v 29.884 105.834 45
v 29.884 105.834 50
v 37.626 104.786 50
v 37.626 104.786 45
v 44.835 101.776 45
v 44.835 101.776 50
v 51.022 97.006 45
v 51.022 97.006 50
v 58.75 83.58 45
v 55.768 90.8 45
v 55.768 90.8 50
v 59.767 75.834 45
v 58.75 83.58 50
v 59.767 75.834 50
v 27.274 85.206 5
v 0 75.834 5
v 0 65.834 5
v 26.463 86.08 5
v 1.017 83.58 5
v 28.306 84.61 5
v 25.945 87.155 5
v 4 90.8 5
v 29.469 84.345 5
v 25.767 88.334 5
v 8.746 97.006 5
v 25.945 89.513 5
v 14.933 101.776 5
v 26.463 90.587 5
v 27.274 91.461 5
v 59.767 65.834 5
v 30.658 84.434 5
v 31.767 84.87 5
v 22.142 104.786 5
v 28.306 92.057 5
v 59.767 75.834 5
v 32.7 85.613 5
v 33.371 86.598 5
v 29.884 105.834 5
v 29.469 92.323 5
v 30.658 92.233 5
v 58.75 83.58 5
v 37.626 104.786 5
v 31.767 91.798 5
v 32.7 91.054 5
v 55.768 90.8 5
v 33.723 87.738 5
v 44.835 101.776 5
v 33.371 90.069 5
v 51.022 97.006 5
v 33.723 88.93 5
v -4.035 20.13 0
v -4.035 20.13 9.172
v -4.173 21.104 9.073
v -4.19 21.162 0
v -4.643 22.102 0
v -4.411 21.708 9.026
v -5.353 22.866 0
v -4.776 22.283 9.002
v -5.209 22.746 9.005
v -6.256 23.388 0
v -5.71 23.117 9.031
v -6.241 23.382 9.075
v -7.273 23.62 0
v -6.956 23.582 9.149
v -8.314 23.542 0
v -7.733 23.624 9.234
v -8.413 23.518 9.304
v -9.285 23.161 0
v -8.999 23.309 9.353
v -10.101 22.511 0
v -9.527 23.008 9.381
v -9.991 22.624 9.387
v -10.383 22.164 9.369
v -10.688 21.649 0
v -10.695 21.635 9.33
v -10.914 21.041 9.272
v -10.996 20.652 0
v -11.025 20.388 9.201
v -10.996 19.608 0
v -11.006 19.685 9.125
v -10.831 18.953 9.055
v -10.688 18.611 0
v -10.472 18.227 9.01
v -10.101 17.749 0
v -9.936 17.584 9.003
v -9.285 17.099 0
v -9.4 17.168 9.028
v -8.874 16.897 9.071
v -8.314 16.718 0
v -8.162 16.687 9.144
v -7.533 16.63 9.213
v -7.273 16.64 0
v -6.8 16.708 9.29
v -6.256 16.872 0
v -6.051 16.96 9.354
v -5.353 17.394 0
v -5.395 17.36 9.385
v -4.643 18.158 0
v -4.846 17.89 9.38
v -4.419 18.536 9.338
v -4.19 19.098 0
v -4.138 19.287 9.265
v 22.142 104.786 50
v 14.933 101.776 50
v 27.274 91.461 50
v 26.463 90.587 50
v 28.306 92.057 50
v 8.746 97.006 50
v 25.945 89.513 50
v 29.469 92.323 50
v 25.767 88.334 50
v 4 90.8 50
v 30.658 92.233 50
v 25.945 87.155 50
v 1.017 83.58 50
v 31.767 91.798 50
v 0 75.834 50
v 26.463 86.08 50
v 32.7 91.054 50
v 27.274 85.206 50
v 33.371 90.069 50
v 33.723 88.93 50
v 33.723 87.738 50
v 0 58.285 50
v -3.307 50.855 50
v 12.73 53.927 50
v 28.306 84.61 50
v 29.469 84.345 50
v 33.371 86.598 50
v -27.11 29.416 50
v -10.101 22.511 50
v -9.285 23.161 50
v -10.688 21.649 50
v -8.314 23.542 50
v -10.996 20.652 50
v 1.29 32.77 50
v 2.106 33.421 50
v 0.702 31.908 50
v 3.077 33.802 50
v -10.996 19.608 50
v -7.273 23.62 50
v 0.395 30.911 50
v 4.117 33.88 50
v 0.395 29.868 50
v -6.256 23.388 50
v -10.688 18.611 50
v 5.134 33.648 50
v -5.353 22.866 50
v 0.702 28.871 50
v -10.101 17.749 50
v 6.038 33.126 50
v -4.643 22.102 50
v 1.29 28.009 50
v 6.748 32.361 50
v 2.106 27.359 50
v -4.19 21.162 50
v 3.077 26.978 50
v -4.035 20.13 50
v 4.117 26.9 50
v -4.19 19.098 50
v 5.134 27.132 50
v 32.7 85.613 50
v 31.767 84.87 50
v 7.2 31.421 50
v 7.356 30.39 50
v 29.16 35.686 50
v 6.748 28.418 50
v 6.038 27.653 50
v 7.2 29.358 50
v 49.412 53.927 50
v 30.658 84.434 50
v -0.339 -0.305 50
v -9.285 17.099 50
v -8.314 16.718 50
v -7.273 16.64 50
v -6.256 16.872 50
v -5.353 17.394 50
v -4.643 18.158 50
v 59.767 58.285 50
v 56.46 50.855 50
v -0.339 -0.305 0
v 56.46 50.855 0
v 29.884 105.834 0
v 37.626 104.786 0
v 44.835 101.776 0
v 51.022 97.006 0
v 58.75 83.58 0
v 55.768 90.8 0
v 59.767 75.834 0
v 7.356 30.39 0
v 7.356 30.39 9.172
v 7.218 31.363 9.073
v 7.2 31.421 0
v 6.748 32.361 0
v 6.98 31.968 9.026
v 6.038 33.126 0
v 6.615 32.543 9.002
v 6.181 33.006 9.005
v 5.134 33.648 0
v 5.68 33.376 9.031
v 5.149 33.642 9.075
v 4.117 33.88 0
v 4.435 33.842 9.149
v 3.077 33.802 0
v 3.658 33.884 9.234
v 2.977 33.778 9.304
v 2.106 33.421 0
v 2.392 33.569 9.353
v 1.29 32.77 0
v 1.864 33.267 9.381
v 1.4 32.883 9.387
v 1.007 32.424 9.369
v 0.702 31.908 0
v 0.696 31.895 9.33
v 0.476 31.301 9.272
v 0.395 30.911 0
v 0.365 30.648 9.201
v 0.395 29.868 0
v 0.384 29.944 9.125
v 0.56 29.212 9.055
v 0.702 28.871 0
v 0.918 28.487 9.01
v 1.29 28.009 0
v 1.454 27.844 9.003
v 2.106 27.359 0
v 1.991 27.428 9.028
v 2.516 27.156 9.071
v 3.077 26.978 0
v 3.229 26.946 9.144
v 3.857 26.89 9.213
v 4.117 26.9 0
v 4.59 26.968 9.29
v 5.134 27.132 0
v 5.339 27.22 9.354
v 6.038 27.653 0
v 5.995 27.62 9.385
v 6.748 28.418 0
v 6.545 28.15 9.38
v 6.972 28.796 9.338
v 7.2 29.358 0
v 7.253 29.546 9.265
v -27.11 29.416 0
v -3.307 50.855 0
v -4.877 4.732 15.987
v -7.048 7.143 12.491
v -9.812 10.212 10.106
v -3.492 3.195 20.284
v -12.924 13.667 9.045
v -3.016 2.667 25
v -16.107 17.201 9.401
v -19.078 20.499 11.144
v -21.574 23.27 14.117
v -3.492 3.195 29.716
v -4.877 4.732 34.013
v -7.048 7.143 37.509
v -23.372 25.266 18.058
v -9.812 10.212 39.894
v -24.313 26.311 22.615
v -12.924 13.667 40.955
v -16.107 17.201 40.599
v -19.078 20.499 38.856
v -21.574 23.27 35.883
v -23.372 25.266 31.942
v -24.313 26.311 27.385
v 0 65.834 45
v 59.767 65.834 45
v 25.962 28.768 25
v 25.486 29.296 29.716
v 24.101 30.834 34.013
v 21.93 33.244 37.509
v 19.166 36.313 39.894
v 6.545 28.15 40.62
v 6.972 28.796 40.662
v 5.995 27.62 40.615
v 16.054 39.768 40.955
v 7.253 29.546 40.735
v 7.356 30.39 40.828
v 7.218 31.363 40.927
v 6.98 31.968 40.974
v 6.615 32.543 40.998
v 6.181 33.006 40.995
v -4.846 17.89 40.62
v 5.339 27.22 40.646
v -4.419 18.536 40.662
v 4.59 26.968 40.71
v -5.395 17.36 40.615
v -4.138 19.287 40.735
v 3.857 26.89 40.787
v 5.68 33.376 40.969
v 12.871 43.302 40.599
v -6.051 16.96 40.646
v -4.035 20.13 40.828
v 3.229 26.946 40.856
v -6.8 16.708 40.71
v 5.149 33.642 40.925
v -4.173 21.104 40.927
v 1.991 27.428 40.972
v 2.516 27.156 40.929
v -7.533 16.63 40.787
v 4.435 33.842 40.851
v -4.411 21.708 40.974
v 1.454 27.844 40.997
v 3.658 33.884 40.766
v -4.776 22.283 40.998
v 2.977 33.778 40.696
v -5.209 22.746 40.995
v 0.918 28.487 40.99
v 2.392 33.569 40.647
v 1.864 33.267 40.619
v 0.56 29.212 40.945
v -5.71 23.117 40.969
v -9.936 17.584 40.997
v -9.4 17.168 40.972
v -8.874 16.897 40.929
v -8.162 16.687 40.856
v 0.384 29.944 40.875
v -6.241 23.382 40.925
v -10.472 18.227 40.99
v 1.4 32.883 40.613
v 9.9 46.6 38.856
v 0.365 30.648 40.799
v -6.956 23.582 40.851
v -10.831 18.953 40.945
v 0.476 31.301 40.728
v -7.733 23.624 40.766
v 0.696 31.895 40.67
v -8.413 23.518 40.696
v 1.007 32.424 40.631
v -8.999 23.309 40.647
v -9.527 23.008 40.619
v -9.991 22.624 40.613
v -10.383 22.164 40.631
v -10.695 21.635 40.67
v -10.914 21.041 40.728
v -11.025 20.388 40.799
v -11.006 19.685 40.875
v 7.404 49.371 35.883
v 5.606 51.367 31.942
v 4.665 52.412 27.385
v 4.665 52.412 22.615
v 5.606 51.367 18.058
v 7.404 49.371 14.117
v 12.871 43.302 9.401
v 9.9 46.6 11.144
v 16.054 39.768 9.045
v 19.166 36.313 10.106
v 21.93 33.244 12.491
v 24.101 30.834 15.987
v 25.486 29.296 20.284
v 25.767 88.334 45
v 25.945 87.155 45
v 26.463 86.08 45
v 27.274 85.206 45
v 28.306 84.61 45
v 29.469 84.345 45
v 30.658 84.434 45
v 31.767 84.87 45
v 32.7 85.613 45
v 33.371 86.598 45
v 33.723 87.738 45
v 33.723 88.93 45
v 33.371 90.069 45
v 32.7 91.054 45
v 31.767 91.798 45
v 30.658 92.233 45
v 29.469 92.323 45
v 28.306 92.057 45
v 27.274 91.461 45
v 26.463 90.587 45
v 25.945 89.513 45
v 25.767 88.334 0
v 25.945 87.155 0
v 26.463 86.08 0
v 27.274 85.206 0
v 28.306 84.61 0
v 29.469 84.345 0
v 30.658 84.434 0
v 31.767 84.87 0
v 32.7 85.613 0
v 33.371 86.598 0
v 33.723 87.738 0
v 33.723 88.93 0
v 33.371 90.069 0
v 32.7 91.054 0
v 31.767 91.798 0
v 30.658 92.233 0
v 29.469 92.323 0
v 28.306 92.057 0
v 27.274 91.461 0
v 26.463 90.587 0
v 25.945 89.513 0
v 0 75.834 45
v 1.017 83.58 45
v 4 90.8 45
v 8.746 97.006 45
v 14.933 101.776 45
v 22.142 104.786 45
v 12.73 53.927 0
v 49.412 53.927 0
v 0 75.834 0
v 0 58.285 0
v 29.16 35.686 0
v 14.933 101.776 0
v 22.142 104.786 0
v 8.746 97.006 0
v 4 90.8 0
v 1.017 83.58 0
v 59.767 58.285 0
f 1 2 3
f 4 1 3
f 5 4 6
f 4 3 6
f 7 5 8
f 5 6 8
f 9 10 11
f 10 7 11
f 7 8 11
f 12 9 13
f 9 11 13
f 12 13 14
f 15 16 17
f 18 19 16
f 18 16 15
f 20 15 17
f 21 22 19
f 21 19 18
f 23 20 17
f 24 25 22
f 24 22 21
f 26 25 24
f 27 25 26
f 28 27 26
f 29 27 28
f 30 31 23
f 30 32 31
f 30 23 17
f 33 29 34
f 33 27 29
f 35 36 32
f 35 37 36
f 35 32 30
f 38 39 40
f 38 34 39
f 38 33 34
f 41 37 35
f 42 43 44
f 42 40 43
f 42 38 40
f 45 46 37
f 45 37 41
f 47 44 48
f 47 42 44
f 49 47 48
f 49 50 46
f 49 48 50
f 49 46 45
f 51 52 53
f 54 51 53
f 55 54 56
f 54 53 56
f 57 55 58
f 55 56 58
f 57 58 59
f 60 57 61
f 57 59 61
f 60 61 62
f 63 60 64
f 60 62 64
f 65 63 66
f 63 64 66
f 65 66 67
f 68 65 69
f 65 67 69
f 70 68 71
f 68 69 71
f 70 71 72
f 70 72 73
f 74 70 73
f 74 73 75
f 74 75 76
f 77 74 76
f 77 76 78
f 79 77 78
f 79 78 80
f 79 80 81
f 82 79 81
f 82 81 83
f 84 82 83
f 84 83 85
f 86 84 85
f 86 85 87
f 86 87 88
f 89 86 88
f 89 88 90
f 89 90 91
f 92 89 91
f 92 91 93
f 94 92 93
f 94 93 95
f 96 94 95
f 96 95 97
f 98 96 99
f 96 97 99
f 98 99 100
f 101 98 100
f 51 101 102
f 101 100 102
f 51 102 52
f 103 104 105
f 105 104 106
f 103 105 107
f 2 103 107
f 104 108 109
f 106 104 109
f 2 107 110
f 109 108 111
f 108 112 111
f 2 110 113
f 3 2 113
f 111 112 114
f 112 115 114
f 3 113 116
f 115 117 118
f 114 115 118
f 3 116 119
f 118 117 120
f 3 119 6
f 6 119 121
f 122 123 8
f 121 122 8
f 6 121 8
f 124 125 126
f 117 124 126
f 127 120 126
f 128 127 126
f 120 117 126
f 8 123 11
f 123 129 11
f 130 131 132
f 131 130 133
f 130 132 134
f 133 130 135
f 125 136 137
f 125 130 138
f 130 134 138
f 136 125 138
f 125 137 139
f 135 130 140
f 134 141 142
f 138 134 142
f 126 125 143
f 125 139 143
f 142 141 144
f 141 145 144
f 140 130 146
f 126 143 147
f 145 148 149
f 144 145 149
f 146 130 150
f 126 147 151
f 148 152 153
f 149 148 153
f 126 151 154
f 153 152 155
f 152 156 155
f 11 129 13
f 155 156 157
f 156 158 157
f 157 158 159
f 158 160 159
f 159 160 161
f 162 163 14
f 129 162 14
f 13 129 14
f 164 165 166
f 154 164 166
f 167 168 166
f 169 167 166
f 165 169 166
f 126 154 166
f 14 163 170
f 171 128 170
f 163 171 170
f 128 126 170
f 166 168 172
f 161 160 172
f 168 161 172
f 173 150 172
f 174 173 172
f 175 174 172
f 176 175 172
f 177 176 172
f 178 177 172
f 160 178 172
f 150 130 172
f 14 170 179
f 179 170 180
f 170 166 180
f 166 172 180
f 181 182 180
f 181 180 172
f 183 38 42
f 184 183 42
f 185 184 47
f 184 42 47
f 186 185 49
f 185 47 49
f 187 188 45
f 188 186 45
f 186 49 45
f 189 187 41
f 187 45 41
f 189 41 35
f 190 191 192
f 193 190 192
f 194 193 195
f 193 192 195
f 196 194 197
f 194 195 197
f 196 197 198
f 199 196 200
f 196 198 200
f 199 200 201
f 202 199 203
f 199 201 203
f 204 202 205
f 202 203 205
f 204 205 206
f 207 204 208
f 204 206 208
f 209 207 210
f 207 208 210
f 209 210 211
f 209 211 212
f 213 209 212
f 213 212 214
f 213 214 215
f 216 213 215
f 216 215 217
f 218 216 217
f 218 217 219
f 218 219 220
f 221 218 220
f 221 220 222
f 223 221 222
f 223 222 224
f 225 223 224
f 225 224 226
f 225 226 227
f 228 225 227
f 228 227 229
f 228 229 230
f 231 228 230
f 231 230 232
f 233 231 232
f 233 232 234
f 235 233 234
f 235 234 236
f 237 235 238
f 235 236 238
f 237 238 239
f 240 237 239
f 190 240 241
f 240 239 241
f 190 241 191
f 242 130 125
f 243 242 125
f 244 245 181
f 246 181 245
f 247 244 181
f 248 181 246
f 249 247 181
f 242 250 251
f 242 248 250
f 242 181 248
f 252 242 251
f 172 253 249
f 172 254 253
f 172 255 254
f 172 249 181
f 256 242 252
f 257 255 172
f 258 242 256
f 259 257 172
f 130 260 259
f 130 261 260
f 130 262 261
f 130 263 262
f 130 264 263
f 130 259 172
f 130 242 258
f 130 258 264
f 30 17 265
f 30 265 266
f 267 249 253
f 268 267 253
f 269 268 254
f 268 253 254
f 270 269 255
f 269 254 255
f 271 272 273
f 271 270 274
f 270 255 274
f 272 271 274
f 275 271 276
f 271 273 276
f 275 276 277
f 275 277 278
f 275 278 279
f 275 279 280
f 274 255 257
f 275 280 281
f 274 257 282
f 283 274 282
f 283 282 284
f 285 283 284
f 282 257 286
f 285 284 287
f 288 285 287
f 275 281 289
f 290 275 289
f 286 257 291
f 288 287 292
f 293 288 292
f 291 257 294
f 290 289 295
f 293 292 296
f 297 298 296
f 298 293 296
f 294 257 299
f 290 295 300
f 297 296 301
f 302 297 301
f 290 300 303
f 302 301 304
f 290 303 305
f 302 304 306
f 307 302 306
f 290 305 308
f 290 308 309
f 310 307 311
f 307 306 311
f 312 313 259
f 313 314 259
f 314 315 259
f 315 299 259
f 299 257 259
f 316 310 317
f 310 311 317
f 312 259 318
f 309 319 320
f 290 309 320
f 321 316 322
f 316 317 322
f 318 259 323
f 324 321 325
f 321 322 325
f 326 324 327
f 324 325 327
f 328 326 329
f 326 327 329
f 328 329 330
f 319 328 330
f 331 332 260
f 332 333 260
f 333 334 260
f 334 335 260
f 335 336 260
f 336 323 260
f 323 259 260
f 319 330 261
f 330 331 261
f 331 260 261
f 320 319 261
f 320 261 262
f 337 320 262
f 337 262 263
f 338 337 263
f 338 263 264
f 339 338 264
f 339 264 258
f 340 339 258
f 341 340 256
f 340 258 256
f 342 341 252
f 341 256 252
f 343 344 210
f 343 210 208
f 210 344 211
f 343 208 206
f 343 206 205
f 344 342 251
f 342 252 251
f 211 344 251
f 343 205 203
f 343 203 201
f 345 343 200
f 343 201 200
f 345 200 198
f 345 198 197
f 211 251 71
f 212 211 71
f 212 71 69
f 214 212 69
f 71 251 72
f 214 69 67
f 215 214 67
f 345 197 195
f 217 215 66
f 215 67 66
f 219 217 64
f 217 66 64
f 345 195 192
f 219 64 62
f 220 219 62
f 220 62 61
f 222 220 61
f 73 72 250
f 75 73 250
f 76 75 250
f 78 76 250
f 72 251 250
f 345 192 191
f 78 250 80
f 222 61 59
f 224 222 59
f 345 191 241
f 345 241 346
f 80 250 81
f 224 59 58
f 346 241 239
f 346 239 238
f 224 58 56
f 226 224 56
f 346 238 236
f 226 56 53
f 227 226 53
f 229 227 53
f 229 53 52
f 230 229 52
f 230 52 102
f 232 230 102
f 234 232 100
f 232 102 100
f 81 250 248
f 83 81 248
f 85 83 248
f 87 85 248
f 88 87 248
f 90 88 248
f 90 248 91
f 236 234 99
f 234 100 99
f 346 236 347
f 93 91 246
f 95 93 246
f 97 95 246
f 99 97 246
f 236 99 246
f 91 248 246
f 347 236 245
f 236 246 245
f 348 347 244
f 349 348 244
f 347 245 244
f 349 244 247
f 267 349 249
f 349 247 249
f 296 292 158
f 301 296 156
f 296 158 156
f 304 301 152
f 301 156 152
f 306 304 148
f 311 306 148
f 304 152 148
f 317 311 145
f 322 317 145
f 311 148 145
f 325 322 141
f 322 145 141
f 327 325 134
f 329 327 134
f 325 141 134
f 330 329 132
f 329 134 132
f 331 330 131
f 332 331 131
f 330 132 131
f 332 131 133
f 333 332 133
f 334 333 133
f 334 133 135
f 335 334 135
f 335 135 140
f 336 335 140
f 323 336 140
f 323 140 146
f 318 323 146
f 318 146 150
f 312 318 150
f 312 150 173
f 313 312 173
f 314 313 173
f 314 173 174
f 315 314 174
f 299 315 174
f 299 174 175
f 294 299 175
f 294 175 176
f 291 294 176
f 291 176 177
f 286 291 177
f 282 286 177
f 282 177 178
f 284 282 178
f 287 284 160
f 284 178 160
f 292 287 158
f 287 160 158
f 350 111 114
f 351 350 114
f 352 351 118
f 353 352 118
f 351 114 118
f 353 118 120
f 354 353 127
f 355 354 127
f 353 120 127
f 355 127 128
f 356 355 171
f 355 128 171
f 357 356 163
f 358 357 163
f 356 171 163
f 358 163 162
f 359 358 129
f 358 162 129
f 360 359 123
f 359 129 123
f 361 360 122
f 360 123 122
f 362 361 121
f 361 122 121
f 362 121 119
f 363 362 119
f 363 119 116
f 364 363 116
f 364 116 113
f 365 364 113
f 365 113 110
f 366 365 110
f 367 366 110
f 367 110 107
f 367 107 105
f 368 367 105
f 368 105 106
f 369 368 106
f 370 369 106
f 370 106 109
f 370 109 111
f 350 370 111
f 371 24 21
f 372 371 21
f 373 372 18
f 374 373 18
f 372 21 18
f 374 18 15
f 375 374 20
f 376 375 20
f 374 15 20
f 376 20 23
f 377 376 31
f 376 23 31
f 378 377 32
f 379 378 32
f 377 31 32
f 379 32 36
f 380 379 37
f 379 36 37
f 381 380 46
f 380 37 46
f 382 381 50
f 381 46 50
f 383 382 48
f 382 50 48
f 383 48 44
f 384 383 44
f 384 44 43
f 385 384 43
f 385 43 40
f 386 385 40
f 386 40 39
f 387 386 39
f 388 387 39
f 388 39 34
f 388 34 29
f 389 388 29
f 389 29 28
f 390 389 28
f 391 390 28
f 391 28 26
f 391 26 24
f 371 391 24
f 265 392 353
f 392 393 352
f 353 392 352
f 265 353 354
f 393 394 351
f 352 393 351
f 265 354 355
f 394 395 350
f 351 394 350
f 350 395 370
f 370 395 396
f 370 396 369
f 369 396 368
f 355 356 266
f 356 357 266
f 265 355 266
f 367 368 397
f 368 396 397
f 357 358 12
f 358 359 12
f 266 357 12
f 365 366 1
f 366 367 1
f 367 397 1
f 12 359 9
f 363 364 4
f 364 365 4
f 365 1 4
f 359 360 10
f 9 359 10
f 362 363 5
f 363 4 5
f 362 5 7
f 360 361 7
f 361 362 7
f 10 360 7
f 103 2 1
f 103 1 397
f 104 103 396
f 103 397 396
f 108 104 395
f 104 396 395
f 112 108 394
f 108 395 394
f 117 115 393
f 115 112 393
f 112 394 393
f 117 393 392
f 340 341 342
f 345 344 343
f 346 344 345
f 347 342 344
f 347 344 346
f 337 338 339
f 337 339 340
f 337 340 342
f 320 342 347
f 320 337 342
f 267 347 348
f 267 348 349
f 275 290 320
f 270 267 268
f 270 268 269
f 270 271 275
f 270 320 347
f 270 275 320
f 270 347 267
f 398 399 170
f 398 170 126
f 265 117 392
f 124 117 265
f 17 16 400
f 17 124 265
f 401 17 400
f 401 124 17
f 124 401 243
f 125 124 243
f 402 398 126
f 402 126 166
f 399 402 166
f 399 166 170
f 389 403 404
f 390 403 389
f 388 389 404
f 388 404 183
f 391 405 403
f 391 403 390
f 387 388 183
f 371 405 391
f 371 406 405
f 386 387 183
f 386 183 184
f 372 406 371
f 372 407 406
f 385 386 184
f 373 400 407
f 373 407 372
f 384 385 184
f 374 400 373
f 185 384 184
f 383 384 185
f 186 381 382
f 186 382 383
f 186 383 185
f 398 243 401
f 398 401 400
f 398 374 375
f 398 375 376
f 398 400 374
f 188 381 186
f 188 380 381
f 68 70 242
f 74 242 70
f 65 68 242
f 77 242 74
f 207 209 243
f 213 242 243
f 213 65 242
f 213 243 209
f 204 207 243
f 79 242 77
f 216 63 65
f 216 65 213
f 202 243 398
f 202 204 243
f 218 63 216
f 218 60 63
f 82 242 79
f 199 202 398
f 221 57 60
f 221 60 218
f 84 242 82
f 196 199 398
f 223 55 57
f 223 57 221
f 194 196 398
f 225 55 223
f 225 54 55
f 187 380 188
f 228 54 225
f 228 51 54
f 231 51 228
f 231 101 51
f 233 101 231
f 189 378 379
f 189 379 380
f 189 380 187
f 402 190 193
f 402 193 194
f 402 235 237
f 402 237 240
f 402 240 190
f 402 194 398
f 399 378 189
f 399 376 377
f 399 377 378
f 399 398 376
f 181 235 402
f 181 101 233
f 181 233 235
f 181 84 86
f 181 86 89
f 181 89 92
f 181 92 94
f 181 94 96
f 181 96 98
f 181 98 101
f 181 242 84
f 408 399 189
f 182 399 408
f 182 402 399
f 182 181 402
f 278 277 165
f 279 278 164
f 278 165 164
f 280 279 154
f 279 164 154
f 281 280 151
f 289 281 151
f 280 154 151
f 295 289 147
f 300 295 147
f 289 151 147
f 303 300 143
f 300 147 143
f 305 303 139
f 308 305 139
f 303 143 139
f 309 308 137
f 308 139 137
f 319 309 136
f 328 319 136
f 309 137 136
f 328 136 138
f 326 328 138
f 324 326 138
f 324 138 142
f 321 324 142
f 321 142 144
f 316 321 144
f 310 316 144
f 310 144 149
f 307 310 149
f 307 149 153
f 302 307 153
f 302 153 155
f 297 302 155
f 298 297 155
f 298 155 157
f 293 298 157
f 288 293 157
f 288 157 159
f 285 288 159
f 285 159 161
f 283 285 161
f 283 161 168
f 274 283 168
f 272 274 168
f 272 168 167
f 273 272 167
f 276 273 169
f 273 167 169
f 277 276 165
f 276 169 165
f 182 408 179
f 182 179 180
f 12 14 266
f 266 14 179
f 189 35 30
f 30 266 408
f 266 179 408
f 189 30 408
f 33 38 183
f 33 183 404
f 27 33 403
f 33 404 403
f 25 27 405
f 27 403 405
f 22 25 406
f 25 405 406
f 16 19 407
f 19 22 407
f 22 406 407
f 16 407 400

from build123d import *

# Parameters (mm, degrees)
BOSS_EXTRUDE4_DEPTH = 50
SKETCH6_W           = 59.76747767
SKETCH6_H           = 50
BOSS_EXTRUDE5_DEPTH = 52
SKETCH7_W           = 50
SKETCH7_H           = 40
CUT_EXTRUDE2_DEPTH  = 50
SKETCH9_R           = 16
CUT_EXTRUDE3_DEPTH  = 39
SKETCH10_W          = 59.76747767
SKETCH10_H          = 40
CUT_EXTRUDE4_DEPTH  = 50
CUT_EXTRUDE5_REACH  = 133.427
SKETCH11_R          = 4
CUT_EXTRUDE6_REACH  = 133.427
SKETCH12_R          = 3.5
FILLET2_R           = 30
SKETCH17_W          = 59.76747767
SKETCH17_H          = 40
BOSS_EXTRUDE8_DEPTH = 10
CUT_EXTRUDE8_DEPTH  = 50


with BuildPart() as part:
    # Sketch5 → Boss-Extrude4 (new body)
    with BuildSketch(Plane.XY):
        Polygon((0, 53.833769989), (59.76747767, 53.833769989), (-37.490513215, -33.76845977), (-64.260925192, -4.047338616), align=None)
    extrude(amount=BOSS_EXTRUDE4_DEPTH)

    # Sketch6 → Boss-Extrude5 (add)
    with BuildSketch(Plane(origin=(0, 53.833769989, 0), x_dir=(1, 0, 0), z_dir=(0, 1, 0))):
        with Locations((29.883738835, -25)):
            Rectangle(SKETCH6_W, SKETCH6_H)
    extrude(amount=BOSS_EXTRUDE5_DEPTH)

    # Sketch7 → Cut-Extrude2 (cut)
    with BuildSketch(Plane(origin=(-37.490513215, -33.768459769, 0), x_dir=(0, 0, 1), z_dir=(-0.7430280288371722, -0.6692602994069995, 0))):
        with Locations((25, 20)):
            Rectangle(SKETCH7_W, SKETCH7_H)
    extrude(amount=-CUT_EXTRUDE2_DEPTH, mode=Mode.SUBTRACT)

    # Sketch9 → Cut-Extrude3 (cut)
    with BuildSketch(Plane(origin=(-0.339111773, -0.305444799, 0), x_dir=(0, 0, 1), z_dir=(-0.743028028837172, -0.6692602994069997, 0))):
        with Locations(Location((25, 20, 0), (0, 0, 270))):
            Circle(SKETCH9_R)
    extrude(amount=-CUT_EXTRUDE3_DEPTH, mode=Mode.SUBTRACT)

    # Sketch10 → Cut-Extrude4 (cut)
    with BuildSketch(Plane(origin=(0, 105.833769989, 0), x_dir=(1, 0, 0), z_dir=(0, 1, 0))):
        with Locations((29.883738835, -25)):
            Rectangle(SKETCH10_W, SKETCH10_H)
    extrude(amount=-CUT_EXTRUDE4_DEPTH, mode=Mode.SUBTRACT)

    # Cut-Extrude5: up to this face of the body (flat: up to its plane)
    cut_extrude5_end = Plane(part.part.faces().sort_by_distance((21.675181221, 59.791215604, 0))[0])
    # Sketch11 → Cut-Extrude5 (cut, up to the picked face)
    with BuildSketch(Plane.XY.offset(50), mode=Mode.PRIVATE) as cut_extrude5_sk1:
        with Locations(Location((29.76747767, 88.333769989, 0), (0, 0, 180))):
            Circle(SKETCH11_R)
    cut_extrude5_tool1 = split(extrude(cut_extrude5_sk1.sketch, amount=-CUT_EXTRUDE5_REACH, mode=Mode.PRIVATE), bisect_by=cut_extrude5_end, keep=Keep.BOTH, mode=Mode.PRIVATE)
    add(cut_extrude5_tool1.solids().sort_by(Axis((29.767478, 88.33377, 50), (0, 0, -1)))[0], mode=Mode.SUBTRACT)

    # Cut-Extrude6: up to this face of the body (flat: up to its plane)
    cut_extrude6_end = Plane(part.part.faces().sort_by_distance((21.599927582, 59.525786489, 0))[0])
    # Sketch12 → Cut-Extrude6 (cut, up to the picked face)
    with BuildSketch(Plane.XY.offset(50), mode=Mode.PRIVATE) as cut_extrude6_sk1:
        with Locations((3.855725401, 30.389814462)):
            Circle(SKETCH12_R)
    cut_extrude6_tool1 = split(extrude(cut_extrude6_sk1.sketch, amount=-CUT_EXTRUDE6_REACH, mode=Mode.PRIVATE), bisect_by=cut_extrude6_end, keep=Keep.BOTH, mode=Mode.PRIVATE)
    # Sketch12 → Cut-Extrude6 (cut, up to the picked face)
    with BuildSketch(Plane.XY.offset(50), mode=Mode.PRIVATE) as cut_extrude6_sk2:
        with Locations((-7.534894281, 20.130054072)):
            Circle(SKETCH12_R)
    cut_extrude6_tool2 = split(extrude(cut_extrude6_sk2.sketch, amount=-CUT_EXTRUDE6_REACH, mode=Mode.PRIVATE), bisect_by=cut_extrude6_end, keep=Keep.BOTH, mode=Mode.PRIVATE)
    add(cut_extrude6_tool1.solids().sort_by(Axis((3.855725, 30.389814, 50), (0, 0, -1)))[0], mode=Mode.SUBTRACT)
    add(cut_extrude6_tool2.solids().sort_by(Axis((-7.534894, 20.130054, 50), (0, 0, -1)))[0], mode=Mode.SUBTRACT)

    # Fillet2
    # the kernel refuses this fillet: 30 mm, written as the material it takes off along each edge
    with BuildSketch(Plane(origin=(59.76747767, 105.833769989, 125), x_dir=(0, -1, 0), z_dir=(0, 0, -1)), Plane(origin=(0, 105.833769989, -30), x_dir=(0, -1, 0), z_dir=(0, 0, 1)), Plane(origin=(59.76747767, 105.833769989, 80), x_dir=(0, -1, 0), z_dir=(0, 0, -1))) as fillet2_piece_1:
        with BuildLine():
            CenterArc((FILLET2_R, FILLET2_R), FILLET2_R, 180, 90)
            Line((0, FILLET2_R), (0, 0))
            Line((0, 0), (FILLET2_R, 0))
        make_face()
    extrude(amount=155, mode=Mode.SUBTRACT)
    with BuildSketch(Plane(origin=(0, 105.833769989, -75), x_dir=(1, 0, 0), z_dir=(0, 0, 1))) as fillet2_piece_2:
        with BuildLine():
            CenterArc((FILLET2_R, -FILLET2_R), FILLET2_R, 90, 90)
            Line((0, -FILLET2_R), (0, 0))
            Line((0, 0), (FILLET2_R, 0))
        make_face()
    extrude(amount=155, mode=Mode.SUBTRACT)

    # Sketch17 → Boss-Extrude8 (add)
    with BuildSketch(Plane(origin=(0, 55.833769989, 0), x_dir=(1, 0, 0), z_dir=(0, 1, 0))):
        with Locations((29.883738835, -25)):
            Rectangle(SKETCH17_W, SKETCH17_H)
    extrude(amount=BOSS_EXTRUDE8_DEPTH)

    # Chamfer5
    # the kernel refuses this chamfer: 10 mm, written as the material it adds along each edge
    with BuildSketch(Plane(origin=(0, 53.833769989, 0), x_dir=(0.03375152736497673, 0.9994302548955236, 0), z_dir=(0, 0, 1))) as chamfer5_piece_1:
        with BuildLine():
            Line((4.819419462, 0), (-3.459685747, 3.355201705))
            Line((-3.459685747, 3.355201705), (-3.603688974, 3.216410241))
            ThreePointArc((-3.603688974, 3.216410241), (-1.815286192, 1.595249898), (-0.144003227, -0.138791464))
            Line((-0.144003227, -0.138791464), (0.006750305, -0.199886051))
            ThreePointArc((0.006750305, -0.199886051), (2.413714978, -0.118601005), (4.826169768, -0.199886051))
            Line((4.826169768, -0.199886051), (4.819419462, 0))
        make_face()
    extrude(amount=50)

    # Chamfer6
    # the kernel refuses this chamfer: 10 mm, written as the material it takes off along each edge
    with BuildSketch(Plane(origin=(59.76747767, 53.833769989, -12.048548655), x_dir=(0.03375152736497822, 0.9994302548955234, 0), z_dir=(0, 0, 1))) as chamfer6_piece_1:
        with BuildLine():
            Line((4.819419462, 0), (-3.459685747, 3.355201705))
            Line((-3.459685747, 3.355201705), (-3.603688974, 3.216410241))
            ThreePointArc((-3.603688974, 3.216410241), (-1.815286192, 1.595249898), (-0.144003227, -0.138791464))
            Line((-0.144003227, -0.138791464), (0.006750305, -0.199886051))
            ThreePointArc((0.006750305, -0.199886051), (2.413714978, -0.118601005), (4.826169768, -0.199886051))
            Line((4.826169768, -0.199886051), (4.819419462, 0))
        make_face()
    extrude(amount=74.097097311, mode=Mode.SUBTRACT)

    # Sketch18 → Cut-Extrude8 (cut)
    with BuildSketch(Plane(origin=(0, 0, 0), x_dir=(-1, 0, 0), z_dir=(0, 0, -1))):
        Polygon((-29.160349369, 35.686223292), (-49.412180648, 53.927455304), (-12.730104581, 53.927455304), align=None)
    extrude(amount=-CUT_EXTRUDE8_DEPTH, mode=Mode.SUBTRACT)


solid = part.part
